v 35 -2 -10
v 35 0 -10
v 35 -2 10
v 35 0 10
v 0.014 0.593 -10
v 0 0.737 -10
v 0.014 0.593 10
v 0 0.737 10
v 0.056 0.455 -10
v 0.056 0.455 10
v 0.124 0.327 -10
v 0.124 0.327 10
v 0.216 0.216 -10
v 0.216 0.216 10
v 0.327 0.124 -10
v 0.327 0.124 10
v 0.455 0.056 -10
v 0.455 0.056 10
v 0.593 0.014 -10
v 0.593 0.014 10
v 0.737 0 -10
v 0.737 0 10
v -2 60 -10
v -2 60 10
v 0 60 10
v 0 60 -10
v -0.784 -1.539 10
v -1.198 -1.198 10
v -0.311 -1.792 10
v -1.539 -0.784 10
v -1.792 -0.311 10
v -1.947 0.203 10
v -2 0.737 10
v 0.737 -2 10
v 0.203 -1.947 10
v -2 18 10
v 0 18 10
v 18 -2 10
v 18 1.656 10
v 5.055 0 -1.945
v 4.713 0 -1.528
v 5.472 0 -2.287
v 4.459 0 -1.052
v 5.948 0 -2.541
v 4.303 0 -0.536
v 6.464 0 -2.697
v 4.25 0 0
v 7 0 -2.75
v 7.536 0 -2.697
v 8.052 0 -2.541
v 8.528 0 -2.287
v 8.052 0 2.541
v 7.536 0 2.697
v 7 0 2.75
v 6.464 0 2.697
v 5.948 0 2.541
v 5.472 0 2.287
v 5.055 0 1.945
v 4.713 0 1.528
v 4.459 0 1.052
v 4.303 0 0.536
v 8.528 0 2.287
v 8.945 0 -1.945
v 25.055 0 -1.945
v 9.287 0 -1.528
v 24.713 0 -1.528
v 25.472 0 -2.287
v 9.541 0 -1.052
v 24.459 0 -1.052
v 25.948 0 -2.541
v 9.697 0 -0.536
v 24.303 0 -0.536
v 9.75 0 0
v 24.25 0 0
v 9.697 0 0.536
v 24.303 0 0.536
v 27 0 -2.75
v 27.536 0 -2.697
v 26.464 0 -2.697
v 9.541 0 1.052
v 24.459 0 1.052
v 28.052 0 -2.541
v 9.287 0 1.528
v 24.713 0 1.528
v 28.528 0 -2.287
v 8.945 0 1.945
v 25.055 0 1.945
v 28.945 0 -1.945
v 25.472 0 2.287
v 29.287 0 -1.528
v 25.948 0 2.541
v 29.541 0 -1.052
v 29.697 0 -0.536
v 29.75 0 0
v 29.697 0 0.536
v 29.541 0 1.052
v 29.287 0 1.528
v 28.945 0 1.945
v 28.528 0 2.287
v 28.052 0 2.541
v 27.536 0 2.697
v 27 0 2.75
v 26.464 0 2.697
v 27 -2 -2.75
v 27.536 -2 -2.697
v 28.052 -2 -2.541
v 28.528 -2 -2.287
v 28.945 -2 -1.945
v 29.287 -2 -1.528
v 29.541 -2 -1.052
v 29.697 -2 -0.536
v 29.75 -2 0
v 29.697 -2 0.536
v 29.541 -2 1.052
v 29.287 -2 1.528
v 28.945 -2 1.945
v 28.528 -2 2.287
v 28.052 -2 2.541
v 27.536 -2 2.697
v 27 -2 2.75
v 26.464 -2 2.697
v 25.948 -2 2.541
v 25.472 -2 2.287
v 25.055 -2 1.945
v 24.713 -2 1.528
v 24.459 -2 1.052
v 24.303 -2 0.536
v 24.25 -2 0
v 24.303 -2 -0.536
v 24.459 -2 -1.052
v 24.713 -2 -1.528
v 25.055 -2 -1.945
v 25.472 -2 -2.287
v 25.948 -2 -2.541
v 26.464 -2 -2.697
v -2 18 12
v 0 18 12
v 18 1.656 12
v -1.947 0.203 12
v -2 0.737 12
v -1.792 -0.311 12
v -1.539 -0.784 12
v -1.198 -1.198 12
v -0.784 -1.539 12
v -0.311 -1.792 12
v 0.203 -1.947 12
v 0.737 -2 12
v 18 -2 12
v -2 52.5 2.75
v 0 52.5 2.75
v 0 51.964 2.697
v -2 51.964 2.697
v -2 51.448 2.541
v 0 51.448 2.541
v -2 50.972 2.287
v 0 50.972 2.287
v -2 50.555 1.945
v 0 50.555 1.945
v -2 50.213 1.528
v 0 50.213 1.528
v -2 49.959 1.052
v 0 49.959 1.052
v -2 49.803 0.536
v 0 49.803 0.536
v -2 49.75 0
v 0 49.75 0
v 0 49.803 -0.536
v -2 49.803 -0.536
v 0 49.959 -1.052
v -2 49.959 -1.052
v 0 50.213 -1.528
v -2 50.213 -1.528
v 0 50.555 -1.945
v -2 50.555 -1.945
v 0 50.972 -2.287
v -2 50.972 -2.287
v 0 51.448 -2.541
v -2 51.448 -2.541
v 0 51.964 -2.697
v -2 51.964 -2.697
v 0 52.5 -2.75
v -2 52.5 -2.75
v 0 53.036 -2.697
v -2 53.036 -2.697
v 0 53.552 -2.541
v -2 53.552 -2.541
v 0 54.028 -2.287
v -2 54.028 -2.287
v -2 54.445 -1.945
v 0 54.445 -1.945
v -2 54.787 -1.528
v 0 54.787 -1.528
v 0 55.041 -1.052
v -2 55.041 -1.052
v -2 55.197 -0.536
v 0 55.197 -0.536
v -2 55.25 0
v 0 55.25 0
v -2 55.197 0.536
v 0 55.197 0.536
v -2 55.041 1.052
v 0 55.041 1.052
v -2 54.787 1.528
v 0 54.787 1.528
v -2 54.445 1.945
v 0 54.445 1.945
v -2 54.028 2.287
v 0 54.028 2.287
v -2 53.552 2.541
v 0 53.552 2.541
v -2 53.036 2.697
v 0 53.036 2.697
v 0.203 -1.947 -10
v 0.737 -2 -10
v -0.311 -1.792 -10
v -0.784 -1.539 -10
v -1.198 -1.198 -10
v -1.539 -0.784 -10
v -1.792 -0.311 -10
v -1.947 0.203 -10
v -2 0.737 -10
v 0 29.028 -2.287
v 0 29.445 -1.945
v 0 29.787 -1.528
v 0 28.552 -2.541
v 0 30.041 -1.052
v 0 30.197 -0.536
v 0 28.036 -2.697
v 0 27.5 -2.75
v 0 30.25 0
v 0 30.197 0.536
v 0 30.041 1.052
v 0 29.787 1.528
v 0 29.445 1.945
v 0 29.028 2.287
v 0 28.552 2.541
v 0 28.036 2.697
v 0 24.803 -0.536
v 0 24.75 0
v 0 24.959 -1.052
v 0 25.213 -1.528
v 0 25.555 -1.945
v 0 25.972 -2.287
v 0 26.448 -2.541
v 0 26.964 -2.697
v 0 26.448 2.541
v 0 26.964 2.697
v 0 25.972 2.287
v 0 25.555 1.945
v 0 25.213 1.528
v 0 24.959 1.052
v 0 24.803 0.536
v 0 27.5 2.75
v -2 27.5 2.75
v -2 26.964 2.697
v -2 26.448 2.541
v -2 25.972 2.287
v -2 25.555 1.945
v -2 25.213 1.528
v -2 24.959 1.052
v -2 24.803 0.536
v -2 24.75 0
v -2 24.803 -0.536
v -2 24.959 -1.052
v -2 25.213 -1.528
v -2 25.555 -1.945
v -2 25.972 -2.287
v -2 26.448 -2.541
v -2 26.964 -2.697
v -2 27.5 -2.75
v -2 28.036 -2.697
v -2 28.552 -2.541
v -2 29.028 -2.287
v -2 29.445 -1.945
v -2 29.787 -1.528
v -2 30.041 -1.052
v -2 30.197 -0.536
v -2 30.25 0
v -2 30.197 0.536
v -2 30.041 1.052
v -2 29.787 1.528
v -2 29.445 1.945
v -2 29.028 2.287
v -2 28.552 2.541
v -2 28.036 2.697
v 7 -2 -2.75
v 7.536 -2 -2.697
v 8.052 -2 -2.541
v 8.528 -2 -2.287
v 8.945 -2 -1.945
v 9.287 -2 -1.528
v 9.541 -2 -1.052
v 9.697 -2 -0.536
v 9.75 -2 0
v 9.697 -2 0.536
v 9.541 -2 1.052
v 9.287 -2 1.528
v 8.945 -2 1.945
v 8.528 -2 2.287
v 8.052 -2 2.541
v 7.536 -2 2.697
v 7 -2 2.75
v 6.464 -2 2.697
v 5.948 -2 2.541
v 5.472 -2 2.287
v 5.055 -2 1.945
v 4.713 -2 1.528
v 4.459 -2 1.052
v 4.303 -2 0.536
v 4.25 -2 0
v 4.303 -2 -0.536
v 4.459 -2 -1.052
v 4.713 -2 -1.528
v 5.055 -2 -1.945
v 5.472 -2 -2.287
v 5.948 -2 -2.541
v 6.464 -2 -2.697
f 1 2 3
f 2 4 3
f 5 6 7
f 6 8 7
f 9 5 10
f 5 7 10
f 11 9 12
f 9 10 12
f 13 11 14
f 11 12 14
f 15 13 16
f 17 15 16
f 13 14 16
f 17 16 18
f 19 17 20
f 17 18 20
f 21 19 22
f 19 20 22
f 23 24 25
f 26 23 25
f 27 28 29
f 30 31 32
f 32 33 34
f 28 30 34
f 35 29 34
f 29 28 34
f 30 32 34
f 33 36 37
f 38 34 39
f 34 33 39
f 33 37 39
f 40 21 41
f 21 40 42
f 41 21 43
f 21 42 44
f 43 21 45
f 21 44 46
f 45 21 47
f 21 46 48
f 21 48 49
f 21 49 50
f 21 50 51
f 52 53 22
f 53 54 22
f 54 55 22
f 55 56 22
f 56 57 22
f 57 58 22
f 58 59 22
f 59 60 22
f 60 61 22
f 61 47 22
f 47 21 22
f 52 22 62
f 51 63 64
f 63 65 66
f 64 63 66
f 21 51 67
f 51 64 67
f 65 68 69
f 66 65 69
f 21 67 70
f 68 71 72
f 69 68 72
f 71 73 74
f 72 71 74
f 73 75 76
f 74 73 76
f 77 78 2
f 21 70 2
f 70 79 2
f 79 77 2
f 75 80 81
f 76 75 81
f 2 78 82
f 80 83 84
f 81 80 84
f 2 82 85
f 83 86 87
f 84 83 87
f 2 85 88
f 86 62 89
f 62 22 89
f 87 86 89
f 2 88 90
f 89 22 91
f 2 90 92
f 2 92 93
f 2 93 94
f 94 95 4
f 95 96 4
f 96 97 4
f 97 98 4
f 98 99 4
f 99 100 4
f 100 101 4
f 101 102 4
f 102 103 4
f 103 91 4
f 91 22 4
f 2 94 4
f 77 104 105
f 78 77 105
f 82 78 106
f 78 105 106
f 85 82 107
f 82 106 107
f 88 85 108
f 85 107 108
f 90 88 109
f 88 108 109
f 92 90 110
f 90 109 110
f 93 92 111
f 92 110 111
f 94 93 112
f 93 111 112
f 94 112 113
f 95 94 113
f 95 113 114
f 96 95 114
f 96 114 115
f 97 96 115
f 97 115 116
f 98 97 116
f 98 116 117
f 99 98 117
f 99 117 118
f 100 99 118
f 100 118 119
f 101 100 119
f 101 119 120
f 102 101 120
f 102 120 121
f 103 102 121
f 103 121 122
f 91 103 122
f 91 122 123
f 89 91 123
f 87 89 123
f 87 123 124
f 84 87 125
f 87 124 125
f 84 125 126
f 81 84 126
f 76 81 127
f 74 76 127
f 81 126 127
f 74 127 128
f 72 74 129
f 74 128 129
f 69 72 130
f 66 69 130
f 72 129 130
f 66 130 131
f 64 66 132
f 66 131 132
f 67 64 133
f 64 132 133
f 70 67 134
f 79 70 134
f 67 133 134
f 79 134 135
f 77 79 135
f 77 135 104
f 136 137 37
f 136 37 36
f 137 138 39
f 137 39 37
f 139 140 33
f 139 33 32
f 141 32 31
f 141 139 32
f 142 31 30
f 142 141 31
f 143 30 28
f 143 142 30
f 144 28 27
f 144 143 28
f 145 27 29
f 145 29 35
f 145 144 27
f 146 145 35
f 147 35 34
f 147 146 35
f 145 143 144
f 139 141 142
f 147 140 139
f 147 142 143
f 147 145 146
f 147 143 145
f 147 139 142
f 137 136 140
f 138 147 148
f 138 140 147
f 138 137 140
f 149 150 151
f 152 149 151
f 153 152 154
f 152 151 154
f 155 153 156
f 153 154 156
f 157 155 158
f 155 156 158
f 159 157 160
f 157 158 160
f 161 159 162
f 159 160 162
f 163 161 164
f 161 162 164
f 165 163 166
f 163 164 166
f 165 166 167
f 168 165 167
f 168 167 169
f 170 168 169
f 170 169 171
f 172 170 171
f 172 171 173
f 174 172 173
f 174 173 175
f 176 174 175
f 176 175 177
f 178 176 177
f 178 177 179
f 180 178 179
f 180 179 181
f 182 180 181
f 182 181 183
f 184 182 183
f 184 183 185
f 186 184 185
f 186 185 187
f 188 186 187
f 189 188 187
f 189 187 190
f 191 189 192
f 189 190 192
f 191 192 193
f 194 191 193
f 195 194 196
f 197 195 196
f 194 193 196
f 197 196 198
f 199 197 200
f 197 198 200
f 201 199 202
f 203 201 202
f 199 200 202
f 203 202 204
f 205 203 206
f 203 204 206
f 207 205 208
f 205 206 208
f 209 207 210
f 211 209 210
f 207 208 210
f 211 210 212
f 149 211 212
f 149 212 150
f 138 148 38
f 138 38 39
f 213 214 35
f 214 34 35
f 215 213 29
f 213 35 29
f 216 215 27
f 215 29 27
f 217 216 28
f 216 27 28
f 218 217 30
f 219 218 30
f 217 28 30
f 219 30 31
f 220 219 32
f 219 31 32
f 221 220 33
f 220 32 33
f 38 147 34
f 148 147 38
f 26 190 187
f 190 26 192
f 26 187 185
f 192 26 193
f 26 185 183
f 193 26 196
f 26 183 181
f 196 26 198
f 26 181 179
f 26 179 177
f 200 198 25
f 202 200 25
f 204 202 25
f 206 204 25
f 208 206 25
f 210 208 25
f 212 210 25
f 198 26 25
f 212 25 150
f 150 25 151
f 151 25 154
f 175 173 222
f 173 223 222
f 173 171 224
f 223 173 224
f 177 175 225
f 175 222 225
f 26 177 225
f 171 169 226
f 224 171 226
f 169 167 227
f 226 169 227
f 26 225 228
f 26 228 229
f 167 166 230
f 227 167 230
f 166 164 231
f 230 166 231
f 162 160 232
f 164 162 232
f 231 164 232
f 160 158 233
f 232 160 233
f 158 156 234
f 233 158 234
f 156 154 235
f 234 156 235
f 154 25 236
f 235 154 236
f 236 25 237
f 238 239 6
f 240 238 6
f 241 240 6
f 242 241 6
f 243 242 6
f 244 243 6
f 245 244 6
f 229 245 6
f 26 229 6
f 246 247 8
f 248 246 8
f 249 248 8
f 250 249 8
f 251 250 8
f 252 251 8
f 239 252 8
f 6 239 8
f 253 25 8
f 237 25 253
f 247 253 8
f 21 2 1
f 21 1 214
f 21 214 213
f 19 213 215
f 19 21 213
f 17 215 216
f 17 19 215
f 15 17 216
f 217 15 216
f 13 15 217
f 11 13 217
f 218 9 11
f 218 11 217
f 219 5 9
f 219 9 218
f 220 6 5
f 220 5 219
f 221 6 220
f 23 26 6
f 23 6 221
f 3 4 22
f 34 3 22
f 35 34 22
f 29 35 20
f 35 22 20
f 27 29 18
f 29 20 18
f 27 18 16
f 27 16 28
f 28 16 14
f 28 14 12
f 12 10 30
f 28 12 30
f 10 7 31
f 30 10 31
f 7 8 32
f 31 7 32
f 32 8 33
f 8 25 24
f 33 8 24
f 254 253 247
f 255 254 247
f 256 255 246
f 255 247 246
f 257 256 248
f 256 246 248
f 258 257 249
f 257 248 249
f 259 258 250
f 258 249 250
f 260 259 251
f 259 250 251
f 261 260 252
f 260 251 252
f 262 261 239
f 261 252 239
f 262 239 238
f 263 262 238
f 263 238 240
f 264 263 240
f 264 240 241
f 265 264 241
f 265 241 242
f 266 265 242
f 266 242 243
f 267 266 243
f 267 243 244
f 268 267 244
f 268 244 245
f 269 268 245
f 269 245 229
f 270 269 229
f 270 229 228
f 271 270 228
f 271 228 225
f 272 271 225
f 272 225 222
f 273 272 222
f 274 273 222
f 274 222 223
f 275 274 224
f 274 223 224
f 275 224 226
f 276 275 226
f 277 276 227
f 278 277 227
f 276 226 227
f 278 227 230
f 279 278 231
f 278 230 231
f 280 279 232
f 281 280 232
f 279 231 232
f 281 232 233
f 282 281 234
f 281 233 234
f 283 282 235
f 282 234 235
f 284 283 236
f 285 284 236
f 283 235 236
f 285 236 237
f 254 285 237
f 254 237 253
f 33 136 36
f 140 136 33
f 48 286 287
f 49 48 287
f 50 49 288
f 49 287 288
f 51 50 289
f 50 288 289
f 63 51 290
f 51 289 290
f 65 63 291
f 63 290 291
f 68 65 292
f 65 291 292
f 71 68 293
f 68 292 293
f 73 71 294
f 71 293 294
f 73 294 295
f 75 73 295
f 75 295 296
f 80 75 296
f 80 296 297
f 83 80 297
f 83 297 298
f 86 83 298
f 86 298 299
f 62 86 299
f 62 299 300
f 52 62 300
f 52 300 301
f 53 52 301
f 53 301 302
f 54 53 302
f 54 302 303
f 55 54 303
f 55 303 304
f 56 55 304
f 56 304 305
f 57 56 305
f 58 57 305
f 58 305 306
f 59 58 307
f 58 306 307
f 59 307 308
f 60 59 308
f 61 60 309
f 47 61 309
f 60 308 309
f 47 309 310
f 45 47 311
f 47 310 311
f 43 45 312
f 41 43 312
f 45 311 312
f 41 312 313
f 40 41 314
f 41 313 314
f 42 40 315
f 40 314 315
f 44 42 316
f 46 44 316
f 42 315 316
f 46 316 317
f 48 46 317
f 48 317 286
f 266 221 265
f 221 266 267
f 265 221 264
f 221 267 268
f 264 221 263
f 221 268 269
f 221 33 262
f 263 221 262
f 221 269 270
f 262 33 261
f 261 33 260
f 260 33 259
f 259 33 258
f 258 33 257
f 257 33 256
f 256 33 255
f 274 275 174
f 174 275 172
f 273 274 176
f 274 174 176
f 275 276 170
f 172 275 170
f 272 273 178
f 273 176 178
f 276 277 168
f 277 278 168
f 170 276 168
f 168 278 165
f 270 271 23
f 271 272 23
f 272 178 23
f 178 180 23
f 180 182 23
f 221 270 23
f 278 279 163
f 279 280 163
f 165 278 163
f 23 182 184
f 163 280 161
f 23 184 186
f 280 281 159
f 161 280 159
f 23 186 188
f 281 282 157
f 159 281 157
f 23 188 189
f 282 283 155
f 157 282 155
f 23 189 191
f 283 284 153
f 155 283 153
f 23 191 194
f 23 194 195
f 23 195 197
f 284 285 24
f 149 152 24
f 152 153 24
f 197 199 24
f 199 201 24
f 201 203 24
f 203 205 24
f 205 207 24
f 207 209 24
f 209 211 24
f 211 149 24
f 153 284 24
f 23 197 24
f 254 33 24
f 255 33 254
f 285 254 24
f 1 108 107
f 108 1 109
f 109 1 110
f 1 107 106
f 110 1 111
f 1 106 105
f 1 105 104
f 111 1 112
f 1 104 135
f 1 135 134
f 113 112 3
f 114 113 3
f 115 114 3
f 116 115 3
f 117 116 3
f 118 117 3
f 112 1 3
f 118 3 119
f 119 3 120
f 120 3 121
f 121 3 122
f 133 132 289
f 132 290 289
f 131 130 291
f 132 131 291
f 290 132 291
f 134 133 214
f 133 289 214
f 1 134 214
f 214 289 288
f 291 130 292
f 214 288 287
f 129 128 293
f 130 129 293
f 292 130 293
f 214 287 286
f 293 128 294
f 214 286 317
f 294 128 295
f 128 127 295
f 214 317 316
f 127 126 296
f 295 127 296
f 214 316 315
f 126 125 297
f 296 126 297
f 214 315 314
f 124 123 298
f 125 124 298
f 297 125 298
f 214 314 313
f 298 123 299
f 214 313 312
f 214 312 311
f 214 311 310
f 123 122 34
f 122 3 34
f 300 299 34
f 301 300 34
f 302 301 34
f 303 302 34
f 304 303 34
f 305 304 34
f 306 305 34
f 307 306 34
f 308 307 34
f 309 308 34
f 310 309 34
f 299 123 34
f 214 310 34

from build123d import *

# Parameters (mm, degrees)
SM_BASE_FLANGE_1_DEPTH  = 10
HOLE_WIZARD_5_5_5_5_1_D = 5.5
HOLE_WIZARD_5_5_5_5_2_D = 5.5
SM_START                = 2
SM_BASE_FLANGE_2_DEPTH  = 2


# Sheet-metal steps are written as plain solids
with BuildPart() as part:
    # Sketch 1 → 基体-法兰1 (new, symmetric)
    with BuildSketch(Plane.XY):
        with BuildLine():
            Line((0, 60), (0, 0.7366))
            ThreePointArc((0, 0.7366), (0.215745145, 0.215745145), (0.7366, 0))
            Line((0.7366, 0), (35, 0))
            Line((35, 0), (35, -2))
            Line((35, -2), (0.7366, -2))
            ThreePointArc((0.7366, -2), (-1.198468417, -1.198468417), (-2, 0.7366))
            Line((-2, 0.7366), (-2, 60))
            Line((-2, 60), (0, 60))
        make_face()
    extrude(amount=SM_BASE_FLANGE_1_DEPTH, both=True)

    # Ø5.5 (5.5) 直径孔1 (through all)
    with Locations(Plane(origin=(7, 0, 0), x_dir=(0, 0, 1), z_dir=(0, 1, 0))):
        with Locations((0, 0), (0, 20)):
            Hole(HOLE_WIZARD_5_5_5_5_1_D / 2)

    # Ø5.5 (5.5) 直径孔2 (through all)
    with Locations(Plane(origin=(-2, 52.5, 0), x_dir=(0, 0, -1), z_dir=(-1, 0, 0))):
        with Locations((0, 0), (0, 25)):
            Hole(HOLE_WIZARD_5_5_5_5_2_D / 2)


with BuildPart() as body_2:
    # 草图11 → 基体-法兰2 (new body)
    with BuildSketch(Plane.XY.offset(10).offset(SM_START)):
        with BuildLine():
            Line((18, -2), (18, 1.656389448))
            Line((18, 1.656389448), (0, 18))
            Line((0, 18), (-2, 18))
            Line((-2, 18), (-2, 0.7366))
            ThreePointArc((-2, 0.7366), (-1.198468417, -1.198468417), (0.7366, -2))
            Line((0.7366, -2), (18, -2))
        make_face()
    extrude(amount=-SM_BASE_FLANGE_2_DEPTH)


solid = Compound([part.part, body_2.part])
